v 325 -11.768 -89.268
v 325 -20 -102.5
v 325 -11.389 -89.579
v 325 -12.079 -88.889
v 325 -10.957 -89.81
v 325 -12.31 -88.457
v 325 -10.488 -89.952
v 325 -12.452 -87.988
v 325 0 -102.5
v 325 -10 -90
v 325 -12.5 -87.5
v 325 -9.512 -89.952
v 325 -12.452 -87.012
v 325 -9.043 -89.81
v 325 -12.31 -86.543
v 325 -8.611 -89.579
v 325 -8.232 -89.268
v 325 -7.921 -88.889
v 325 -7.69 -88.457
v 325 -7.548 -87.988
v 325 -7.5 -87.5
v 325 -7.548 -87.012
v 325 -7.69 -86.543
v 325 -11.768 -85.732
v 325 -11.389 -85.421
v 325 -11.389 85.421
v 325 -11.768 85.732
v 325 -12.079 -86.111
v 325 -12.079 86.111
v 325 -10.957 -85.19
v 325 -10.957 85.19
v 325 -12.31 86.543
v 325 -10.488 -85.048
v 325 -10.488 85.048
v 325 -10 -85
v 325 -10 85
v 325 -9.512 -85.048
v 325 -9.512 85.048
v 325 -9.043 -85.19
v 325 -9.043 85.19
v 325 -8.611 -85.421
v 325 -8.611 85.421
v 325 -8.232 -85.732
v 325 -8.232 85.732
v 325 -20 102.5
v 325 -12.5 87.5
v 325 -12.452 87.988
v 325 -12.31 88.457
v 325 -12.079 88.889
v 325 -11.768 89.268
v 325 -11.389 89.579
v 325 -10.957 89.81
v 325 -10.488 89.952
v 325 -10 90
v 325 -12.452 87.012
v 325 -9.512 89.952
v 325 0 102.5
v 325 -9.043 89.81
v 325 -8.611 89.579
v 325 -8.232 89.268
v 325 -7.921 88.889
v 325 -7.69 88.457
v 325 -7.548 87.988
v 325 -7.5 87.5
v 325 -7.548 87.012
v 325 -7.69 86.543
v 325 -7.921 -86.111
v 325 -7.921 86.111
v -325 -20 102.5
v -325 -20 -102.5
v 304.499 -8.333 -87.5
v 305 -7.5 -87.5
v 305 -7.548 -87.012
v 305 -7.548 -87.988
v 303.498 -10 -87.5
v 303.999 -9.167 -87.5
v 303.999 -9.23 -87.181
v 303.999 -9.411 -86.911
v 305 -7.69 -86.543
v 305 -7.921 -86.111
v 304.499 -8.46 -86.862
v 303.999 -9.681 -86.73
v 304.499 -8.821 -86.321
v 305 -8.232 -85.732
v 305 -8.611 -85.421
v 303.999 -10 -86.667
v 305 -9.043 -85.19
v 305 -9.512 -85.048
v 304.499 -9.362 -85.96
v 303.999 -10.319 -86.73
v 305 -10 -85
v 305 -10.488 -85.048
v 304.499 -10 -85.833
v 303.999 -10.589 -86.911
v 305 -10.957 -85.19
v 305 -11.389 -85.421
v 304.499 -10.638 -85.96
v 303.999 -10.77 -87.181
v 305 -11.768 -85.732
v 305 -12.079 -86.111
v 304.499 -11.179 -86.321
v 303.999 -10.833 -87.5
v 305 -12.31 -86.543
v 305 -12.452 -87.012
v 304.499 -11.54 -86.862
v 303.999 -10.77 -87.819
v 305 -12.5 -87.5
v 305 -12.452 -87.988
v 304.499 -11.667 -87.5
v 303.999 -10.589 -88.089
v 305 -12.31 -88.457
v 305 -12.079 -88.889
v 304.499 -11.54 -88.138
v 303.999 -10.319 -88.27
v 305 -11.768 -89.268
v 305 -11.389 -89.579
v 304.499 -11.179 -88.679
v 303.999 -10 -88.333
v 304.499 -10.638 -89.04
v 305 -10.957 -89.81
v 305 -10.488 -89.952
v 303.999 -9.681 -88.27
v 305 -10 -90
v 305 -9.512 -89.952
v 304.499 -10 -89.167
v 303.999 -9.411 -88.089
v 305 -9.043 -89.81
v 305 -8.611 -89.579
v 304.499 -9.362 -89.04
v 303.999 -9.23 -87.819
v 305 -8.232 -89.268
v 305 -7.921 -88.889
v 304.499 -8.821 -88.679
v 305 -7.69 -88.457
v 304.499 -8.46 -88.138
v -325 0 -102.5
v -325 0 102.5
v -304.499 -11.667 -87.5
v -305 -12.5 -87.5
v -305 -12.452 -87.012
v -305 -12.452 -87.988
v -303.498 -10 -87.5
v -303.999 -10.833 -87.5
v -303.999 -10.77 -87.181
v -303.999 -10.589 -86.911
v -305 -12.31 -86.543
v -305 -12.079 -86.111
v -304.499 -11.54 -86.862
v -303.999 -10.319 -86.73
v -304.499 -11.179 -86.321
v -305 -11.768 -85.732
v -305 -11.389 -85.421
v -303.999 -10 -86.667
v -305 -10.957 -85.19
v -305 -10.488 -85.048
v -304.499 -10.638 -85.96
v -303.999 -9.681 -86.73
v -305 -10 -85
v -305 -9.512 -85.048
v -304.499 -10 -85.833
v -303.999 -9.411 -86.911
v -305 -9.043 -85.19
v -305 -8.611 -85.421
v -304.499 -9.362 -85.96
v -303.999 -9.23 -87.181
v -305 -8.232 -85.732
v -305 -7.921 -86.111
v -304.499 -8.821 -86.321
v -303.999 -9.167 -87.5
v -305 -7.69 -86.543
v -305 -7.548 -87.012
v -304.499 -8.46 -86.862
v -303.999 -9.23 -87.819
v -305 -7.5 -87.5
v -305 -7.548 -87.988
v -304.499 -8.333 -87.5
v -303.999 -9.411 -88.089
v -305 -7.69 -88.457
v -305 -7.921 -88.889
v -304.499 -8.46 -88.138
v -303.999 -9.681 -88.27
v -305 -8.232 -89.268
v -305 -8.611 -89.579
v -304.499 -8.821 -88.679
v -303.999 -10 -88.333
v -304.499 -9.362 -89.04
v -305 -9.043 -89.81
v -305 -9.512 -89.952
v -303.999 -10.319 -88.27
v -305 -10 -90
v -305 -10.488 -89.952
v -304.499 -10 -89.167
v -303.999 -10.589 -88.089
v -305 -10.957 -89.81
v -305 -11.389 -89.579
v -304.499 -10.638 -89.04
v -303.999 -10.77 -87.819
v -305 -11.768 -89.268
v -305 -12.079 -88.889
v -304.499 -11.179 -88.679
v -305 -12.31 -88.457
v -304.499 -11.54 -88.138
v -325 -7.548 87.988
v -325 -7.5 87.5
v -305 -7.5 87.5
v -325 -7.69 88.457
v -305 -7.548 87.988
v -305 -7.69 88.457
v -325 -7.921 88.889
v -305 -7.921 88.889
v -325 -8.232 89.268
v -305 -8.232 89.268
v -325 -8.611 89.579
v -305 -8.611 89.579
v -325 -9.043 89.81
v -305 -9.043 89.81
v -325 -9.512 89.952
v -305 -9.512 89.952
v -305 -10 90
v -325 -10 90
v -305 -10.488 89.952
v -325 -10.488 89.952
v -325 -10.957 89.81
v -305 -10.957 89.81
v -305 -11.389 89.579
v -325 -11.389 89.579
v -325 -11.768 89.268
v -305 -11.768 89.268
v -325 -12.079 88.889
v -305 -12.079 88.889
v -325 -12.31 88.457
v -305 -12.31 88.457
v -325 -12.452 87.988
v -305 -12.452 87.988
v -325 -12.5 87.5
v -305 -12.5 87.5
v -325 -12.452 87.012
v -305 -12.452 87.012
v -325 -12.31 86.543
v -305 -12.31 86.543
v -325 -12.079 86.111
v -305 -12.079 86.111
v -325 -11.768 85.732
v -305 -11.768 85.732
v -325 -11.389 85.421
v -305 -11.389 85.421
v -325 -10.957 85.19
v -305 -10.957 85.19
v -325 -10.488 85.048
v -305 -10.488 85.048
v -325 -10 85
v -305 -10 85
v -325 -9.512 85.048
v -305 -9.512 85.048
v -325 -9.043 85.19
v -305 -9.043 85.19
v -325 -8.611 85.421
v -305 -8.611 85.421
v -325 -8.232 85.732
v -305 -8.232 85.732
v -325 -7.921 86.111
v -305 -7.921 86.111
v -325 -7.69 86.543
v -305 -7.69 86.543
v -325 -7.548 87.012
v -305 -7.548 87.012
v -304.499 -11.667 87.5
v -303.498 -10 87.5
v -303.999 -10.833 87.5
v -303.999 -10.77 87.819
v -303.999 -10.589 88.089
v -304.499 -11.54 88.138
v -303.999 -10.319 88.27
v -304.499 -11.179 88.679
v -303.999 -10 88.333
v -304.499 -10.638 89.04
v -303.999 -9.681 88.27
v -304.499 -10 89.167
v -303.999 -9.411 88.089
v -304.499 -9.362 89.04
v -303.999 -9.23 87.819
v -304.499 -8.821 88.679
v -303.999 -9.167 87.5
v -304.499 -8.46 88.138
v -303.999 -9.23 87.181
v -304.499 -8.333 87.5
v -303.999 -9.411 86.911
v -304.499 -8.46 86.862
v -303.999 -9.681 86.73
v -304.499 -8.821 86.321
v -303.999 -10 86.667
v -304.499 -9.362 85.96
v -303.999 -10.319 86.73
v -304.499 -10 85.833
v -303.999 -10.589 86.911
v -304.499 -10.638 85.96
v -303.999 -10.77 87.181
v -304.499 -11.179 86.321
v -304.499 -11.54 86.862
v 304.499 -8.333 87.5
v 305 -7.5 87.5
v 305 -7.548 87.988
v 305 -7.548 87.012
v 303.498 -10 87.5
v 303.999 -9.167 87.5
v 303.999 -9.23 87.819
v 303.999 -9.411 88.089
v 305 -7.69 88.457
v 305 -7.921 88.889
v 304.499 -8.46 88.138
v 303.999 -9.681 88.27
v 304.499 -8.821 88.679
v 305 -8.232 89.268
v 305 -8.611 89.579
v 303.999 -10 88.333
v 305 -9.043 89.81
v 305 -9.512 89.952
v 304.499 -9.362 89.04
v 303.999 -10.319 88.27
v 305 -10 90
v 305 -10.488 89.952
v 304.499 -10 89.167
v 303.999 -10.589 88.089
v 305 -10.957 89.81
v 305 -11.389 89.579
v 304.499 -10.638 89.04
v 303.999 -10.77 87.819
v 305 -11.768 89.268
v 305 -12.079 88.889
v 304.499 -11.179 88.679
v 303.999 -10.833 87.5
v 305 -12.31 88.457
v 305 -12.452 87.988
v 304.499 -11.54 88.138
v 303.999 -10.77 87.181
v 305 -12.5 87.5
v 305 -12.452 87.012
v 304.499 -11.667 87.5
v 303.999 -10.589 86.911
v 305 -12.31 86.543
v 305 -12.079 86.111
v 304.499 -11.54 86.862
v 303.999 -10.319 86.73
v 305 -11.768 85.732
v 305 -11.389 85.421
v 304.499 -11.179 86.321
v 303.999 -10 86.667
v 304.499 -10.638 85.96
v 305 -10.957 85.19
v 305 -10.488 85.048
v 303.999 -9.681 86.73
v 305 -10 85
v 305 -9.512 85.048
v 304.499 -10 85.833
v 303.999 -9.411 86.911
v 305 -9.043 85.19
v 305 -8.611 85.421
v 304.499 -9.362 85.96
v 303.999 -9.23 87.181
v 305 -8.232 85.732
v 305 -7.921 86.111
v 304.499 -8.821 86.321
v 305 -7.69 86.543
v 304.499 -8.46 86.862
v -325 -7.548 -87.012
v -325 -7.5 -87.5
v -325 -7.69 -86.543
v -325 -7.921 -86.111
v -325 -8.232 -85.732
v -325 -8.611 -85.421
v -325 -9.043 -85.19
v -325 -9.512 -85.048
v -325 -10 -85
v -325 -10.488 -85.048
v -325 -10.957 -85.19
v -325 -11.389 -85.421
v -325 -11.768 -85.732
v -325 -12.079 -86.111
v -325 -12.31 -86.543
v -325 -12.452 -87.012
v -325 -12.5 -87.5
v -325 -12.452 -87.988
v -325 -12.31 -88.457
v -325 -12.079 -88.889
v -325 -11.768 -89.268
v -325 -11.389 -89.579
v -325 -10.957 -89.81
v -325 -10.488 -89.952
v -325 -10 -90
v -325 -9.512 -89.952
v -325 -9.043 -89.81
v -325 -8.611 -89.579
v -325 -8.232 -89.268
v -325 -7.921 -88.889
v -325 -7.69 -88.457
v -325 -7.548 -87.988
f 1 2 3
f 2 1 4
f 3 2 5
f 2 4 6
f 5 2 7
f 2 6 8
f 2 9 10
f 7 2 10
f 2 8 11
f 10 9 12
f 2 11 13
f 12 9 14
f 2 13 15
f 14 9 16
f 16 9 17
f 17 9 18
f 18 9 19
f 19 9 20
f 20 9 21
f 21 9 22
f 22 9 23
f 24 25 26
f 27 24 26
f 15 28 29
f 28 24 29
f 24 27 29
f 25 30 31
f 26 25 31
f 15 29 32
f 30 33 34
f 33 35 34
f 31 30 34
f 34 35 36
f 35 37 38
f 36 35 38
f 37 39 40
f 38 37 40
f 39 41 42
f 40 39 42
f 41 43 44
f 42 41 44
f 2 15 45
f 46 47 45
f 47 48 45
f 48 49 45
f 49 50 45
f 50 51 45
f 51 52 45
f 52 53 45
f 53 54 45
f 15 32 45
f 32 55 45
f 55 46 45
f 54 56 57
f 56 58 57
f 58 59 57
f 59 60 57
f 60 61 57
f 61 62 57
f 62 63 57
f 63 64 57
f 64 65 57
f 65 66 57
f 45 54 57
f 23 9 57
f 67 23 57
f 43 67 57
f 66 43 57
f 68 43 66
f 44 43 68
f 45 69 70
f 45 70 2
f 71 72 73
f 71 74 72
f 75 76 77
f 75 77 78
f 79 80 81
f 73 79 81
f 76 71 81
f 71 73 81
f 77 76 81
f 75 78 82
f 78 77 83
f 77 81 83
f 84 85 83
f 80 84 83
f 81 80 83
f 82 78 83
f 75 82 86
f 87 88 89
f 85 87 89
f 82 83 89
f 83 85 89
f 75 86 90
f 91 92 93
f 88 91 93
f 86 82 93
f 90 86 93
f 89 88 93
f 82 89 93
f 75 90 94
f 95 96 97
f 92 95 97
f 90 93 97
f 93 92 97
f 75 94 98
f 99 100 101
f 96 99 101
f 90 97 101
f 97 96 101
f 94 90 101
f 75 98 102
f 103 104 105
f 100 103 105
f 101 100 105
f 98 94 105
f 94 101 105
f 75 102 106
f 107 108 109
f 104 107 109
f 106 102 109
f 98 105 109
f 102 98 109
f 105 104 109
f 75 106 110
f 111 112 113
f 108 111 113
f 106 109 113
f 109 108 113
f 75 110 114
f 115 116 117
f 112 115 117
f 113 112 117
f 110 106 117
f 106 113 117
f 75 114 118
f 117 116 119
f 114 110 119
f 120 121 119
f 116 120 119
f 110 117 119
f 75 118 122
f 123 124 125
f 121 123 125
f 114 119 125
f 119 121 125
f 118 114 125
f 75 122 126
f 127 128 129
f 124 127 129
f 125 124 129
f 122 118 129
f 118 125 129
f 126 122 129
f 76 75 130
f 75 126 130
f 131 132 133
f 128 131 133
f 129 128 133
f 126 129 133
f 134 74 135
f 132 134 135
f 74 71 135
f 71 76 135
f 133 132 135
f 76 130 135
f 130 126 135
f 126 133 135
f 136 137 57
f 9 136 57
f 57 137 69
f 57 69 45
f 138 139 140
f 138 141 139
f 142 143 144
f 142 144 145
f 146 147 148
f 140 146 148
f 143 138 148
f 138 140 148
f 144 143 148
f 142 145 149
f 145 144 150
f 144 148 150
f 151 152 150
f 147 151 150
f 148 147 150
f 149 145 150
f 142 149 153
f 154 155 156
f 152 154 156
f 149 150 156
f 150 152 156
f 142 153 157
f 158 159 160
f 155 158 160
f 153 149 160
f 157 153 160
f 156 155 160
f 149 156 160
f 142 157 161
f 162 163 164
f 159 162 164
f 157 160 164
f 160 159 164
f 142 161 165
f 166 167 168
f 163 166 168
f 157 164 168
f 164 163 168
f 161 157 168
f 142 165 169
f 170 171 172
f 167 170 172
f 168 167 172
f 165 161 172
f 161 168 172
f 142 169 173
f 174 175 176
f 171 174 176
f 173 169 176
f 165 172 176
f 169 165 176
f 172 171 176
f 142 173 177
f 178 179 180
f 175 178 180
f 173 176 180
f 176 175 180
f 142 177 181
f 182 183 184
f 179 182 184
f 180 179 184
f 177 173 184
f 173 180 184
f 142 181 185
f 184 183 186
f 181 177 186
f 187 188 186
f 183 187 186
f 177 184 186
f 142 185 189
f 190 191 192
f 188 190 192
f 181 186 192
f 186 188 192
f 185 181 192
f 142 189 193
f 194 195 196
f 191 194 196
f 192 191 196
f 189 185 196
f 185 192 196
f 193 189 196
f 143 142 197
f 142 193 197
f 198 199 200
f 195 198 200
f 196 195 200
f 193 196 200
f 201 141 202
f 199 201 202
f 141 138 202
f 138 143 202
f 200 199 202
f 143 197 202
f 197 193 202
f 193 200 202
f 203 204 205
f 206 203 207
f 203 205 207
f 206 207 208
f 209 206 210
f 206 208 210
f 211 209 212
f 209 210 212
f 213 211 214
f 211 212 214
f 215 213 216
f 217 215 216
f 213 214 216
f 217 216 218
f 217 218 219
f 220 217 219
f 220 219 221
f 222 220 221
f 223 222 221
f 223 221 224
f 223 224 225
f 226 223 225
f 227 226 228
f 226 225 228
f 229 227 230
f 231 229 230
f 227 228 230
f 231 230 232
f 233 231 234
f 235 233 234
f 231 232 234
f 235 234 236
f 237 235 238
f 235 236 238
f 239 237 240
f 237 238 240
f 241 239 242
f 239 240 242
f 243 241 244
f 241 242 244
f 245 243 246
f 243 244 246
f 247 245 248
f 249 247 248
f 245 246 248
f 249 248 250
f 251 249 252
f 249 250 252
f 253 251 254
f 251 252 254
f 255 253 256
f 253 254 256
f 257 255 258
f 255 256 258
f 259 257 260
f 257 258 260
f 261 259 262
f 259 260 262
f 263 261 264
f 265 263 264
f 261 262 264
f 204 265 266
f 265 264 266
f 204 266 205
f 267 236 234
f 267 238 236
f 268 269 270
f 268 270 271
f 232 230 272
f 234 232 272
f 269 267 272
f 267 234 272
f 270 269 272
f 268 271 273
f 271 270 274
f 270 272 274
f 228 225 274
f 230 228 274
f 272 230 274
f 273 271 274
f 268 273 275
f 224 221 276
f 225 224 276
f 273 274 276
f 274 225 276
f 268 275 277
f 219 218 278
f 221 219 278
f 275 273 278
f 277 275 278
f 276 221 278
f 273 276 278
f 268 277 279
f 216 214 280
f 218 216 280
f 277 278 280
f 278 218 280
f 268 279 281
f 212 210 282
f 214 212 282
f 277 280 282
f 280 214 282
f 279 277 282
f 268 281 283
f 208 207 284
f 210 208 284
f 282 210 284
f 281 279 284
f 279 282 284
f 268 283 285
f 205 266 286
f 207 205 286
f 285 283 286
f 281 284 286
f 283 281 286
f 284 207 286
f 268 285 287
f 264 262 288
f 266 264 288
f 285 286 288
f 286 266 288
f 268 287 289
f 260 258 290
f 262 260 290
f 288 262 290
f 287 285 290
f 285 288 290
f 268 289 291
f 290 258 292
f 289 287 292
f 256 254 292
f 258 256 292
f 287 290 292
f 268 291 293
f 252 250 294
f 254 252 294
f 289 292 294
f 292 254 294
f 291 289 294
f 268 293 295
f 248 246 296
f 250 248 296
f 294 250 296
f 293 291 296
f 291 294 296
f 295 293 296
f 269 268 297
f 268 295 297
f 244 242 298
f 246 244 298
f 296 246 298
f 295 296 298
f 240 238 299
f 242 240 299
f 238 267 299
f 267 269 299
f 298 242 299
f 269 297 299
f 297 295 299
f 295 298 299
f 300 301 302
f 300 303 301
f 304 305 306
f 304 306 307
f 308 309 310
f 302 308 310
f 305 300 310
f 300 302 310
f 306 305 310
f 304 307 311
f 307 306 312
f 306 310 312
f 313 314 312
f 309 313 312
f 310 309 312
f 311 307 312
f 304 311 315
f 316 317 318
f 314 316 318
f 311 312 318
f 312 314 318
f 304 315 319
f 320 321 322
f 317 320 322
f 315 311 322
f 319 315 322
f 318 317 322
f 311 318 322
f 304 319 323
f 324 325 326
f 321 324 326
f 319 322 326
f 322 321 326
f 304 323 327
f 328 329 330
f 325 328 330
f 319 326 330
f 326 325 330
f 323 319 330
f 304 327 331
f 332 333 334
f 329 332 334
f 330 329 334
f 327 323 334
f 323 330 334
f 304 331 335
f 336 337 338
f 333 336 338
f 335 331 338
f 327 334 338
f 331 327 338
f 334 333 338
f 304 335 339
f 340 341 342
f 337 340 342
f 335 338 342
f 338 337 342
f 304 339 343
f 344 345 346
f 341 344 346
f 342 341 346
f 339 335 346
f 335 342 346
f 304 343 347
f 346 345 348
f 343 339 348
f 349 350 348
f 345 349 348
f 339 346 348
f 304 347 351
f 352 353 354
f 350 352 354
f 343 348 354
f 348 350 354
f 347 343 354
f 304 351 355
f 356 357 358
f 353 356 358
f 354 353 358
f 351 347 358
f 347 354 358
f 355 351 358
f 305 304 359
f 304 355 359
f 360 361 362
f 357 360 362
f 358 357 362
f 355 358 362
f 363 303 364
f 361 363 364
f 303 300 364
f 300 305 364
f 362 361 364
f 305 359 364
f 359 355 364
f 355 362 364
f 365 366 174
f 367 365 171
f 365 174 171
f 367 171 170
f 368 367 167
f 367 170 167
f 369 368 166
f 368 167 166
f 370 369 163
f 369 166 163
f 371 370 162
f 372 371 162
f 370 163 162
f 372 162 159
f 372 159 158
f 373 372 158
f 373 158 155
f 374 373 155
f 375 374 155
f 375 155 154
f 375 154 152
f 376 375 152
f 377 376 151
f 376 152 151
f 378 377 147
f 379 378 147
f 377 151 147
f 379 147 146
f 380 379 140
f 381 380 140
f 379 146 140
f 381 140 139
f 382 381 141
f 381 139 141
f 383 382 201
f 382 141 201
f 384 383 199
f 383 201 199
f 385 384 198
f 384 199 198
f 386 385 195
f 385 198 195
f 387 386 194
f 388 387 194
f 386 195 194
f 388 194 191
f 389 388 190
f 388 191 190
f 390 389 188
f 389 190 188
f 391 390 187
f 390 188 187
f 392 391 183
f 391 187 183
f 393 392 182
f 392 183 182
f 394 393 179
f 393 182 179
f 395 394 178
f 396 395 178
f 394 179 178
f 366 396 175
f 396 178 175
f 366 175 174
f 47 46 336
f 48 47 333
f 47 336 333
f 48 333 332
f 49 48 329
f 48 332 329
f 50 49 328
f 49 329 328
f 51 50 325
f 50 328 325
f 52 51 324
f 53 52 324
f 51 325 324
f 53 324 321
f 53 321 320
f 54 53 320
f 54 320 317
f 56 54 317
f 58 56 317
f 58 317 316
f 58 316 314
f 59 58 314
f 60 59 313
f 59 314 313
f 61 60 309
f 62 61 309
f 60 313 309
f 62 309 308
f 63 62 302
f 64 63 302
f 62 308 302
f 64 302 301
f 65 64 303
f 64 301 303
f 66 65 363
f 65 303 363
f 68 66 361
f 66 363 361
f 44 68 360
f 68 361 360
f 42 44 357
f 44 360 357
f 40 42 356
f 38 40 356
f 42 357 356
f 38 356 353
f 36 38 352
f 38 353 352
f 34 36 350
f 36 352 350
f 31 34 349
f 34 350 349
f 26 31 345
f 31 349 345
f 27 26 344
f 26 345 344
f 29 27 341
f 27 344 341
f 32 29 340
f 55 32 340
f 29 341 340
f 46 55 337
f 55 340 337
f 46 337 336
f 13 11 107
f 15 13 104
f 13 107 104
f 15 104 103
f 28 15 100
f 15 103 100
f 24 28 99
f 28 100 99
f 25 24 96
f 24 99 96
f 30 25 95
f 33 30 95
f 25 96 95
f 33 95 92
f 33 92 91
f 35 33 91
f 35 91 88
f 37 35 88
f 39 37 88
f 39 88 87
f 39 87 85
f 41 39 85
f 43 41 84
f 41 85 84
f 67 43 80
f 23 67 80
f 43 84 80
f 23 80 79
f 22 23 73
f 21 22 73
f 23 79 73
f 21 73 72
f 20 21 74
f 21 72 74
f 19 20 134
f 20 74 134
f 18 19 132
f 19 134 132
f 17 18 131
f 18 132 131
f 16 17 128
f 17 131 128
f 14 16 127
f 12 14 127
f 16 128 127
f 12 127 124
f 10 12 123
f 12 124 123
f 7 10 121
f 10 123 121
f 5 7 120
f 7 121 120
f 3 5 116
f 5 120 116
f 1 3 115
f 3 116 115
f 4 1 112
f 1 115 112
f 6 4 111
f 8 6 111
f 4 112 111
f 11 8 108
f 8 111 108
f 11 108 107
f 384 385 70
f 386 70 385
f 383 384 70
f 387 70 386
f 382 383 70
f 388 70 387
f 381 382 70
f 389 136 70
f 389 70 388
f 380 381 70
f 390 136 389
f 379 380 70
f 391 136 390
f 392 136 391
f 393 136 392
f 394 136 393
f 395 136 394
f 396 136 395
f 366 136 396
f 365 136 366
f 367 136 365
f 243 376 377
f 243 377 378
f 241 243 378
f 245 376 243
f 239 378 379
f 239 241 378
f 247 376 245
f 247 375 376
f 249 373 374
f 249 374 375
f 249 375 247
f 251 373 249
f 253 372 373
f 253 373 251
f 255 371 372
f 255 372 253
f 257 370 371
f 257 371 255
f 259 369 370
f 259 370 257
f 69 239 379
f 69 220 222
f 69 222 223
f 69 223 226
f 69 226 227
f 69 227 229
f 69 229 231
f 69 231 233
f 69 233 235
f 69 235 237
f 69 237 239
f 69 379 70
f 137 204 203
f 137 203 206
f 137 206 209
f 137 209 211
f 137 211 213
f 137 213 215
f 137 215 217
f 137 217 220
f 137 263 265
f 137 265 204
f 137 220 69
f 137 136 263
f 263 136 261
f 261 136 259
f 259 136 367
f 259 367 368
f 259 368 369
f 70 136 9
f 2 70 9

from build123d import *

# Parameters (mm, degrees)
F0_W     = 650
F0_H     = 205
F1_DEPTH = 20
F3_D     = 5
F3_DEPTH = 20
F3_TIP   = 1.5021515476
F5_D     = 5
F5_DEPTH = 20
F5_TIP   = 1.5021515476


with BuildPart() as f1:
    # F0 (on Front) → F1 (new body)
    with BuildSketch(Plane.XZ):
        Rectangle(F0_W, F0_H)
    extrude(amount=F1_DEPTH)

    # F3
    with Locations(Plane.YZ.offset(325)):
        with Locations((-10, 87.5), (-10, -87.5)):
            Hole(F3_D / 2, depth=F3_DEPTH)
            with Locations((0, 0, -(F3_DEPTH + F3_TIP / 2))):  # 118° drill point
                Cone(0, F3_D / 2, F3_TIP, mode=Mode.SUBTRACT)

    # F5
    with Locations(Plane(origin=(-325, 0, 0), x_dir=(0, -1, 0), z_dir=(-1, 0, 0))):
        with Locations((10, 87.5), (10, -87.5)):
            Hole(F5_D / 2, depth=F5_DEPTH)
            with Locations((0, 0, -(F5_DEPTH + F5_TIP / 2))):  # 118° drill point
                Cone(0, F5_D / 2, F5_TIP, mode=Mode.SUBTRACT)


solid = f1.part
